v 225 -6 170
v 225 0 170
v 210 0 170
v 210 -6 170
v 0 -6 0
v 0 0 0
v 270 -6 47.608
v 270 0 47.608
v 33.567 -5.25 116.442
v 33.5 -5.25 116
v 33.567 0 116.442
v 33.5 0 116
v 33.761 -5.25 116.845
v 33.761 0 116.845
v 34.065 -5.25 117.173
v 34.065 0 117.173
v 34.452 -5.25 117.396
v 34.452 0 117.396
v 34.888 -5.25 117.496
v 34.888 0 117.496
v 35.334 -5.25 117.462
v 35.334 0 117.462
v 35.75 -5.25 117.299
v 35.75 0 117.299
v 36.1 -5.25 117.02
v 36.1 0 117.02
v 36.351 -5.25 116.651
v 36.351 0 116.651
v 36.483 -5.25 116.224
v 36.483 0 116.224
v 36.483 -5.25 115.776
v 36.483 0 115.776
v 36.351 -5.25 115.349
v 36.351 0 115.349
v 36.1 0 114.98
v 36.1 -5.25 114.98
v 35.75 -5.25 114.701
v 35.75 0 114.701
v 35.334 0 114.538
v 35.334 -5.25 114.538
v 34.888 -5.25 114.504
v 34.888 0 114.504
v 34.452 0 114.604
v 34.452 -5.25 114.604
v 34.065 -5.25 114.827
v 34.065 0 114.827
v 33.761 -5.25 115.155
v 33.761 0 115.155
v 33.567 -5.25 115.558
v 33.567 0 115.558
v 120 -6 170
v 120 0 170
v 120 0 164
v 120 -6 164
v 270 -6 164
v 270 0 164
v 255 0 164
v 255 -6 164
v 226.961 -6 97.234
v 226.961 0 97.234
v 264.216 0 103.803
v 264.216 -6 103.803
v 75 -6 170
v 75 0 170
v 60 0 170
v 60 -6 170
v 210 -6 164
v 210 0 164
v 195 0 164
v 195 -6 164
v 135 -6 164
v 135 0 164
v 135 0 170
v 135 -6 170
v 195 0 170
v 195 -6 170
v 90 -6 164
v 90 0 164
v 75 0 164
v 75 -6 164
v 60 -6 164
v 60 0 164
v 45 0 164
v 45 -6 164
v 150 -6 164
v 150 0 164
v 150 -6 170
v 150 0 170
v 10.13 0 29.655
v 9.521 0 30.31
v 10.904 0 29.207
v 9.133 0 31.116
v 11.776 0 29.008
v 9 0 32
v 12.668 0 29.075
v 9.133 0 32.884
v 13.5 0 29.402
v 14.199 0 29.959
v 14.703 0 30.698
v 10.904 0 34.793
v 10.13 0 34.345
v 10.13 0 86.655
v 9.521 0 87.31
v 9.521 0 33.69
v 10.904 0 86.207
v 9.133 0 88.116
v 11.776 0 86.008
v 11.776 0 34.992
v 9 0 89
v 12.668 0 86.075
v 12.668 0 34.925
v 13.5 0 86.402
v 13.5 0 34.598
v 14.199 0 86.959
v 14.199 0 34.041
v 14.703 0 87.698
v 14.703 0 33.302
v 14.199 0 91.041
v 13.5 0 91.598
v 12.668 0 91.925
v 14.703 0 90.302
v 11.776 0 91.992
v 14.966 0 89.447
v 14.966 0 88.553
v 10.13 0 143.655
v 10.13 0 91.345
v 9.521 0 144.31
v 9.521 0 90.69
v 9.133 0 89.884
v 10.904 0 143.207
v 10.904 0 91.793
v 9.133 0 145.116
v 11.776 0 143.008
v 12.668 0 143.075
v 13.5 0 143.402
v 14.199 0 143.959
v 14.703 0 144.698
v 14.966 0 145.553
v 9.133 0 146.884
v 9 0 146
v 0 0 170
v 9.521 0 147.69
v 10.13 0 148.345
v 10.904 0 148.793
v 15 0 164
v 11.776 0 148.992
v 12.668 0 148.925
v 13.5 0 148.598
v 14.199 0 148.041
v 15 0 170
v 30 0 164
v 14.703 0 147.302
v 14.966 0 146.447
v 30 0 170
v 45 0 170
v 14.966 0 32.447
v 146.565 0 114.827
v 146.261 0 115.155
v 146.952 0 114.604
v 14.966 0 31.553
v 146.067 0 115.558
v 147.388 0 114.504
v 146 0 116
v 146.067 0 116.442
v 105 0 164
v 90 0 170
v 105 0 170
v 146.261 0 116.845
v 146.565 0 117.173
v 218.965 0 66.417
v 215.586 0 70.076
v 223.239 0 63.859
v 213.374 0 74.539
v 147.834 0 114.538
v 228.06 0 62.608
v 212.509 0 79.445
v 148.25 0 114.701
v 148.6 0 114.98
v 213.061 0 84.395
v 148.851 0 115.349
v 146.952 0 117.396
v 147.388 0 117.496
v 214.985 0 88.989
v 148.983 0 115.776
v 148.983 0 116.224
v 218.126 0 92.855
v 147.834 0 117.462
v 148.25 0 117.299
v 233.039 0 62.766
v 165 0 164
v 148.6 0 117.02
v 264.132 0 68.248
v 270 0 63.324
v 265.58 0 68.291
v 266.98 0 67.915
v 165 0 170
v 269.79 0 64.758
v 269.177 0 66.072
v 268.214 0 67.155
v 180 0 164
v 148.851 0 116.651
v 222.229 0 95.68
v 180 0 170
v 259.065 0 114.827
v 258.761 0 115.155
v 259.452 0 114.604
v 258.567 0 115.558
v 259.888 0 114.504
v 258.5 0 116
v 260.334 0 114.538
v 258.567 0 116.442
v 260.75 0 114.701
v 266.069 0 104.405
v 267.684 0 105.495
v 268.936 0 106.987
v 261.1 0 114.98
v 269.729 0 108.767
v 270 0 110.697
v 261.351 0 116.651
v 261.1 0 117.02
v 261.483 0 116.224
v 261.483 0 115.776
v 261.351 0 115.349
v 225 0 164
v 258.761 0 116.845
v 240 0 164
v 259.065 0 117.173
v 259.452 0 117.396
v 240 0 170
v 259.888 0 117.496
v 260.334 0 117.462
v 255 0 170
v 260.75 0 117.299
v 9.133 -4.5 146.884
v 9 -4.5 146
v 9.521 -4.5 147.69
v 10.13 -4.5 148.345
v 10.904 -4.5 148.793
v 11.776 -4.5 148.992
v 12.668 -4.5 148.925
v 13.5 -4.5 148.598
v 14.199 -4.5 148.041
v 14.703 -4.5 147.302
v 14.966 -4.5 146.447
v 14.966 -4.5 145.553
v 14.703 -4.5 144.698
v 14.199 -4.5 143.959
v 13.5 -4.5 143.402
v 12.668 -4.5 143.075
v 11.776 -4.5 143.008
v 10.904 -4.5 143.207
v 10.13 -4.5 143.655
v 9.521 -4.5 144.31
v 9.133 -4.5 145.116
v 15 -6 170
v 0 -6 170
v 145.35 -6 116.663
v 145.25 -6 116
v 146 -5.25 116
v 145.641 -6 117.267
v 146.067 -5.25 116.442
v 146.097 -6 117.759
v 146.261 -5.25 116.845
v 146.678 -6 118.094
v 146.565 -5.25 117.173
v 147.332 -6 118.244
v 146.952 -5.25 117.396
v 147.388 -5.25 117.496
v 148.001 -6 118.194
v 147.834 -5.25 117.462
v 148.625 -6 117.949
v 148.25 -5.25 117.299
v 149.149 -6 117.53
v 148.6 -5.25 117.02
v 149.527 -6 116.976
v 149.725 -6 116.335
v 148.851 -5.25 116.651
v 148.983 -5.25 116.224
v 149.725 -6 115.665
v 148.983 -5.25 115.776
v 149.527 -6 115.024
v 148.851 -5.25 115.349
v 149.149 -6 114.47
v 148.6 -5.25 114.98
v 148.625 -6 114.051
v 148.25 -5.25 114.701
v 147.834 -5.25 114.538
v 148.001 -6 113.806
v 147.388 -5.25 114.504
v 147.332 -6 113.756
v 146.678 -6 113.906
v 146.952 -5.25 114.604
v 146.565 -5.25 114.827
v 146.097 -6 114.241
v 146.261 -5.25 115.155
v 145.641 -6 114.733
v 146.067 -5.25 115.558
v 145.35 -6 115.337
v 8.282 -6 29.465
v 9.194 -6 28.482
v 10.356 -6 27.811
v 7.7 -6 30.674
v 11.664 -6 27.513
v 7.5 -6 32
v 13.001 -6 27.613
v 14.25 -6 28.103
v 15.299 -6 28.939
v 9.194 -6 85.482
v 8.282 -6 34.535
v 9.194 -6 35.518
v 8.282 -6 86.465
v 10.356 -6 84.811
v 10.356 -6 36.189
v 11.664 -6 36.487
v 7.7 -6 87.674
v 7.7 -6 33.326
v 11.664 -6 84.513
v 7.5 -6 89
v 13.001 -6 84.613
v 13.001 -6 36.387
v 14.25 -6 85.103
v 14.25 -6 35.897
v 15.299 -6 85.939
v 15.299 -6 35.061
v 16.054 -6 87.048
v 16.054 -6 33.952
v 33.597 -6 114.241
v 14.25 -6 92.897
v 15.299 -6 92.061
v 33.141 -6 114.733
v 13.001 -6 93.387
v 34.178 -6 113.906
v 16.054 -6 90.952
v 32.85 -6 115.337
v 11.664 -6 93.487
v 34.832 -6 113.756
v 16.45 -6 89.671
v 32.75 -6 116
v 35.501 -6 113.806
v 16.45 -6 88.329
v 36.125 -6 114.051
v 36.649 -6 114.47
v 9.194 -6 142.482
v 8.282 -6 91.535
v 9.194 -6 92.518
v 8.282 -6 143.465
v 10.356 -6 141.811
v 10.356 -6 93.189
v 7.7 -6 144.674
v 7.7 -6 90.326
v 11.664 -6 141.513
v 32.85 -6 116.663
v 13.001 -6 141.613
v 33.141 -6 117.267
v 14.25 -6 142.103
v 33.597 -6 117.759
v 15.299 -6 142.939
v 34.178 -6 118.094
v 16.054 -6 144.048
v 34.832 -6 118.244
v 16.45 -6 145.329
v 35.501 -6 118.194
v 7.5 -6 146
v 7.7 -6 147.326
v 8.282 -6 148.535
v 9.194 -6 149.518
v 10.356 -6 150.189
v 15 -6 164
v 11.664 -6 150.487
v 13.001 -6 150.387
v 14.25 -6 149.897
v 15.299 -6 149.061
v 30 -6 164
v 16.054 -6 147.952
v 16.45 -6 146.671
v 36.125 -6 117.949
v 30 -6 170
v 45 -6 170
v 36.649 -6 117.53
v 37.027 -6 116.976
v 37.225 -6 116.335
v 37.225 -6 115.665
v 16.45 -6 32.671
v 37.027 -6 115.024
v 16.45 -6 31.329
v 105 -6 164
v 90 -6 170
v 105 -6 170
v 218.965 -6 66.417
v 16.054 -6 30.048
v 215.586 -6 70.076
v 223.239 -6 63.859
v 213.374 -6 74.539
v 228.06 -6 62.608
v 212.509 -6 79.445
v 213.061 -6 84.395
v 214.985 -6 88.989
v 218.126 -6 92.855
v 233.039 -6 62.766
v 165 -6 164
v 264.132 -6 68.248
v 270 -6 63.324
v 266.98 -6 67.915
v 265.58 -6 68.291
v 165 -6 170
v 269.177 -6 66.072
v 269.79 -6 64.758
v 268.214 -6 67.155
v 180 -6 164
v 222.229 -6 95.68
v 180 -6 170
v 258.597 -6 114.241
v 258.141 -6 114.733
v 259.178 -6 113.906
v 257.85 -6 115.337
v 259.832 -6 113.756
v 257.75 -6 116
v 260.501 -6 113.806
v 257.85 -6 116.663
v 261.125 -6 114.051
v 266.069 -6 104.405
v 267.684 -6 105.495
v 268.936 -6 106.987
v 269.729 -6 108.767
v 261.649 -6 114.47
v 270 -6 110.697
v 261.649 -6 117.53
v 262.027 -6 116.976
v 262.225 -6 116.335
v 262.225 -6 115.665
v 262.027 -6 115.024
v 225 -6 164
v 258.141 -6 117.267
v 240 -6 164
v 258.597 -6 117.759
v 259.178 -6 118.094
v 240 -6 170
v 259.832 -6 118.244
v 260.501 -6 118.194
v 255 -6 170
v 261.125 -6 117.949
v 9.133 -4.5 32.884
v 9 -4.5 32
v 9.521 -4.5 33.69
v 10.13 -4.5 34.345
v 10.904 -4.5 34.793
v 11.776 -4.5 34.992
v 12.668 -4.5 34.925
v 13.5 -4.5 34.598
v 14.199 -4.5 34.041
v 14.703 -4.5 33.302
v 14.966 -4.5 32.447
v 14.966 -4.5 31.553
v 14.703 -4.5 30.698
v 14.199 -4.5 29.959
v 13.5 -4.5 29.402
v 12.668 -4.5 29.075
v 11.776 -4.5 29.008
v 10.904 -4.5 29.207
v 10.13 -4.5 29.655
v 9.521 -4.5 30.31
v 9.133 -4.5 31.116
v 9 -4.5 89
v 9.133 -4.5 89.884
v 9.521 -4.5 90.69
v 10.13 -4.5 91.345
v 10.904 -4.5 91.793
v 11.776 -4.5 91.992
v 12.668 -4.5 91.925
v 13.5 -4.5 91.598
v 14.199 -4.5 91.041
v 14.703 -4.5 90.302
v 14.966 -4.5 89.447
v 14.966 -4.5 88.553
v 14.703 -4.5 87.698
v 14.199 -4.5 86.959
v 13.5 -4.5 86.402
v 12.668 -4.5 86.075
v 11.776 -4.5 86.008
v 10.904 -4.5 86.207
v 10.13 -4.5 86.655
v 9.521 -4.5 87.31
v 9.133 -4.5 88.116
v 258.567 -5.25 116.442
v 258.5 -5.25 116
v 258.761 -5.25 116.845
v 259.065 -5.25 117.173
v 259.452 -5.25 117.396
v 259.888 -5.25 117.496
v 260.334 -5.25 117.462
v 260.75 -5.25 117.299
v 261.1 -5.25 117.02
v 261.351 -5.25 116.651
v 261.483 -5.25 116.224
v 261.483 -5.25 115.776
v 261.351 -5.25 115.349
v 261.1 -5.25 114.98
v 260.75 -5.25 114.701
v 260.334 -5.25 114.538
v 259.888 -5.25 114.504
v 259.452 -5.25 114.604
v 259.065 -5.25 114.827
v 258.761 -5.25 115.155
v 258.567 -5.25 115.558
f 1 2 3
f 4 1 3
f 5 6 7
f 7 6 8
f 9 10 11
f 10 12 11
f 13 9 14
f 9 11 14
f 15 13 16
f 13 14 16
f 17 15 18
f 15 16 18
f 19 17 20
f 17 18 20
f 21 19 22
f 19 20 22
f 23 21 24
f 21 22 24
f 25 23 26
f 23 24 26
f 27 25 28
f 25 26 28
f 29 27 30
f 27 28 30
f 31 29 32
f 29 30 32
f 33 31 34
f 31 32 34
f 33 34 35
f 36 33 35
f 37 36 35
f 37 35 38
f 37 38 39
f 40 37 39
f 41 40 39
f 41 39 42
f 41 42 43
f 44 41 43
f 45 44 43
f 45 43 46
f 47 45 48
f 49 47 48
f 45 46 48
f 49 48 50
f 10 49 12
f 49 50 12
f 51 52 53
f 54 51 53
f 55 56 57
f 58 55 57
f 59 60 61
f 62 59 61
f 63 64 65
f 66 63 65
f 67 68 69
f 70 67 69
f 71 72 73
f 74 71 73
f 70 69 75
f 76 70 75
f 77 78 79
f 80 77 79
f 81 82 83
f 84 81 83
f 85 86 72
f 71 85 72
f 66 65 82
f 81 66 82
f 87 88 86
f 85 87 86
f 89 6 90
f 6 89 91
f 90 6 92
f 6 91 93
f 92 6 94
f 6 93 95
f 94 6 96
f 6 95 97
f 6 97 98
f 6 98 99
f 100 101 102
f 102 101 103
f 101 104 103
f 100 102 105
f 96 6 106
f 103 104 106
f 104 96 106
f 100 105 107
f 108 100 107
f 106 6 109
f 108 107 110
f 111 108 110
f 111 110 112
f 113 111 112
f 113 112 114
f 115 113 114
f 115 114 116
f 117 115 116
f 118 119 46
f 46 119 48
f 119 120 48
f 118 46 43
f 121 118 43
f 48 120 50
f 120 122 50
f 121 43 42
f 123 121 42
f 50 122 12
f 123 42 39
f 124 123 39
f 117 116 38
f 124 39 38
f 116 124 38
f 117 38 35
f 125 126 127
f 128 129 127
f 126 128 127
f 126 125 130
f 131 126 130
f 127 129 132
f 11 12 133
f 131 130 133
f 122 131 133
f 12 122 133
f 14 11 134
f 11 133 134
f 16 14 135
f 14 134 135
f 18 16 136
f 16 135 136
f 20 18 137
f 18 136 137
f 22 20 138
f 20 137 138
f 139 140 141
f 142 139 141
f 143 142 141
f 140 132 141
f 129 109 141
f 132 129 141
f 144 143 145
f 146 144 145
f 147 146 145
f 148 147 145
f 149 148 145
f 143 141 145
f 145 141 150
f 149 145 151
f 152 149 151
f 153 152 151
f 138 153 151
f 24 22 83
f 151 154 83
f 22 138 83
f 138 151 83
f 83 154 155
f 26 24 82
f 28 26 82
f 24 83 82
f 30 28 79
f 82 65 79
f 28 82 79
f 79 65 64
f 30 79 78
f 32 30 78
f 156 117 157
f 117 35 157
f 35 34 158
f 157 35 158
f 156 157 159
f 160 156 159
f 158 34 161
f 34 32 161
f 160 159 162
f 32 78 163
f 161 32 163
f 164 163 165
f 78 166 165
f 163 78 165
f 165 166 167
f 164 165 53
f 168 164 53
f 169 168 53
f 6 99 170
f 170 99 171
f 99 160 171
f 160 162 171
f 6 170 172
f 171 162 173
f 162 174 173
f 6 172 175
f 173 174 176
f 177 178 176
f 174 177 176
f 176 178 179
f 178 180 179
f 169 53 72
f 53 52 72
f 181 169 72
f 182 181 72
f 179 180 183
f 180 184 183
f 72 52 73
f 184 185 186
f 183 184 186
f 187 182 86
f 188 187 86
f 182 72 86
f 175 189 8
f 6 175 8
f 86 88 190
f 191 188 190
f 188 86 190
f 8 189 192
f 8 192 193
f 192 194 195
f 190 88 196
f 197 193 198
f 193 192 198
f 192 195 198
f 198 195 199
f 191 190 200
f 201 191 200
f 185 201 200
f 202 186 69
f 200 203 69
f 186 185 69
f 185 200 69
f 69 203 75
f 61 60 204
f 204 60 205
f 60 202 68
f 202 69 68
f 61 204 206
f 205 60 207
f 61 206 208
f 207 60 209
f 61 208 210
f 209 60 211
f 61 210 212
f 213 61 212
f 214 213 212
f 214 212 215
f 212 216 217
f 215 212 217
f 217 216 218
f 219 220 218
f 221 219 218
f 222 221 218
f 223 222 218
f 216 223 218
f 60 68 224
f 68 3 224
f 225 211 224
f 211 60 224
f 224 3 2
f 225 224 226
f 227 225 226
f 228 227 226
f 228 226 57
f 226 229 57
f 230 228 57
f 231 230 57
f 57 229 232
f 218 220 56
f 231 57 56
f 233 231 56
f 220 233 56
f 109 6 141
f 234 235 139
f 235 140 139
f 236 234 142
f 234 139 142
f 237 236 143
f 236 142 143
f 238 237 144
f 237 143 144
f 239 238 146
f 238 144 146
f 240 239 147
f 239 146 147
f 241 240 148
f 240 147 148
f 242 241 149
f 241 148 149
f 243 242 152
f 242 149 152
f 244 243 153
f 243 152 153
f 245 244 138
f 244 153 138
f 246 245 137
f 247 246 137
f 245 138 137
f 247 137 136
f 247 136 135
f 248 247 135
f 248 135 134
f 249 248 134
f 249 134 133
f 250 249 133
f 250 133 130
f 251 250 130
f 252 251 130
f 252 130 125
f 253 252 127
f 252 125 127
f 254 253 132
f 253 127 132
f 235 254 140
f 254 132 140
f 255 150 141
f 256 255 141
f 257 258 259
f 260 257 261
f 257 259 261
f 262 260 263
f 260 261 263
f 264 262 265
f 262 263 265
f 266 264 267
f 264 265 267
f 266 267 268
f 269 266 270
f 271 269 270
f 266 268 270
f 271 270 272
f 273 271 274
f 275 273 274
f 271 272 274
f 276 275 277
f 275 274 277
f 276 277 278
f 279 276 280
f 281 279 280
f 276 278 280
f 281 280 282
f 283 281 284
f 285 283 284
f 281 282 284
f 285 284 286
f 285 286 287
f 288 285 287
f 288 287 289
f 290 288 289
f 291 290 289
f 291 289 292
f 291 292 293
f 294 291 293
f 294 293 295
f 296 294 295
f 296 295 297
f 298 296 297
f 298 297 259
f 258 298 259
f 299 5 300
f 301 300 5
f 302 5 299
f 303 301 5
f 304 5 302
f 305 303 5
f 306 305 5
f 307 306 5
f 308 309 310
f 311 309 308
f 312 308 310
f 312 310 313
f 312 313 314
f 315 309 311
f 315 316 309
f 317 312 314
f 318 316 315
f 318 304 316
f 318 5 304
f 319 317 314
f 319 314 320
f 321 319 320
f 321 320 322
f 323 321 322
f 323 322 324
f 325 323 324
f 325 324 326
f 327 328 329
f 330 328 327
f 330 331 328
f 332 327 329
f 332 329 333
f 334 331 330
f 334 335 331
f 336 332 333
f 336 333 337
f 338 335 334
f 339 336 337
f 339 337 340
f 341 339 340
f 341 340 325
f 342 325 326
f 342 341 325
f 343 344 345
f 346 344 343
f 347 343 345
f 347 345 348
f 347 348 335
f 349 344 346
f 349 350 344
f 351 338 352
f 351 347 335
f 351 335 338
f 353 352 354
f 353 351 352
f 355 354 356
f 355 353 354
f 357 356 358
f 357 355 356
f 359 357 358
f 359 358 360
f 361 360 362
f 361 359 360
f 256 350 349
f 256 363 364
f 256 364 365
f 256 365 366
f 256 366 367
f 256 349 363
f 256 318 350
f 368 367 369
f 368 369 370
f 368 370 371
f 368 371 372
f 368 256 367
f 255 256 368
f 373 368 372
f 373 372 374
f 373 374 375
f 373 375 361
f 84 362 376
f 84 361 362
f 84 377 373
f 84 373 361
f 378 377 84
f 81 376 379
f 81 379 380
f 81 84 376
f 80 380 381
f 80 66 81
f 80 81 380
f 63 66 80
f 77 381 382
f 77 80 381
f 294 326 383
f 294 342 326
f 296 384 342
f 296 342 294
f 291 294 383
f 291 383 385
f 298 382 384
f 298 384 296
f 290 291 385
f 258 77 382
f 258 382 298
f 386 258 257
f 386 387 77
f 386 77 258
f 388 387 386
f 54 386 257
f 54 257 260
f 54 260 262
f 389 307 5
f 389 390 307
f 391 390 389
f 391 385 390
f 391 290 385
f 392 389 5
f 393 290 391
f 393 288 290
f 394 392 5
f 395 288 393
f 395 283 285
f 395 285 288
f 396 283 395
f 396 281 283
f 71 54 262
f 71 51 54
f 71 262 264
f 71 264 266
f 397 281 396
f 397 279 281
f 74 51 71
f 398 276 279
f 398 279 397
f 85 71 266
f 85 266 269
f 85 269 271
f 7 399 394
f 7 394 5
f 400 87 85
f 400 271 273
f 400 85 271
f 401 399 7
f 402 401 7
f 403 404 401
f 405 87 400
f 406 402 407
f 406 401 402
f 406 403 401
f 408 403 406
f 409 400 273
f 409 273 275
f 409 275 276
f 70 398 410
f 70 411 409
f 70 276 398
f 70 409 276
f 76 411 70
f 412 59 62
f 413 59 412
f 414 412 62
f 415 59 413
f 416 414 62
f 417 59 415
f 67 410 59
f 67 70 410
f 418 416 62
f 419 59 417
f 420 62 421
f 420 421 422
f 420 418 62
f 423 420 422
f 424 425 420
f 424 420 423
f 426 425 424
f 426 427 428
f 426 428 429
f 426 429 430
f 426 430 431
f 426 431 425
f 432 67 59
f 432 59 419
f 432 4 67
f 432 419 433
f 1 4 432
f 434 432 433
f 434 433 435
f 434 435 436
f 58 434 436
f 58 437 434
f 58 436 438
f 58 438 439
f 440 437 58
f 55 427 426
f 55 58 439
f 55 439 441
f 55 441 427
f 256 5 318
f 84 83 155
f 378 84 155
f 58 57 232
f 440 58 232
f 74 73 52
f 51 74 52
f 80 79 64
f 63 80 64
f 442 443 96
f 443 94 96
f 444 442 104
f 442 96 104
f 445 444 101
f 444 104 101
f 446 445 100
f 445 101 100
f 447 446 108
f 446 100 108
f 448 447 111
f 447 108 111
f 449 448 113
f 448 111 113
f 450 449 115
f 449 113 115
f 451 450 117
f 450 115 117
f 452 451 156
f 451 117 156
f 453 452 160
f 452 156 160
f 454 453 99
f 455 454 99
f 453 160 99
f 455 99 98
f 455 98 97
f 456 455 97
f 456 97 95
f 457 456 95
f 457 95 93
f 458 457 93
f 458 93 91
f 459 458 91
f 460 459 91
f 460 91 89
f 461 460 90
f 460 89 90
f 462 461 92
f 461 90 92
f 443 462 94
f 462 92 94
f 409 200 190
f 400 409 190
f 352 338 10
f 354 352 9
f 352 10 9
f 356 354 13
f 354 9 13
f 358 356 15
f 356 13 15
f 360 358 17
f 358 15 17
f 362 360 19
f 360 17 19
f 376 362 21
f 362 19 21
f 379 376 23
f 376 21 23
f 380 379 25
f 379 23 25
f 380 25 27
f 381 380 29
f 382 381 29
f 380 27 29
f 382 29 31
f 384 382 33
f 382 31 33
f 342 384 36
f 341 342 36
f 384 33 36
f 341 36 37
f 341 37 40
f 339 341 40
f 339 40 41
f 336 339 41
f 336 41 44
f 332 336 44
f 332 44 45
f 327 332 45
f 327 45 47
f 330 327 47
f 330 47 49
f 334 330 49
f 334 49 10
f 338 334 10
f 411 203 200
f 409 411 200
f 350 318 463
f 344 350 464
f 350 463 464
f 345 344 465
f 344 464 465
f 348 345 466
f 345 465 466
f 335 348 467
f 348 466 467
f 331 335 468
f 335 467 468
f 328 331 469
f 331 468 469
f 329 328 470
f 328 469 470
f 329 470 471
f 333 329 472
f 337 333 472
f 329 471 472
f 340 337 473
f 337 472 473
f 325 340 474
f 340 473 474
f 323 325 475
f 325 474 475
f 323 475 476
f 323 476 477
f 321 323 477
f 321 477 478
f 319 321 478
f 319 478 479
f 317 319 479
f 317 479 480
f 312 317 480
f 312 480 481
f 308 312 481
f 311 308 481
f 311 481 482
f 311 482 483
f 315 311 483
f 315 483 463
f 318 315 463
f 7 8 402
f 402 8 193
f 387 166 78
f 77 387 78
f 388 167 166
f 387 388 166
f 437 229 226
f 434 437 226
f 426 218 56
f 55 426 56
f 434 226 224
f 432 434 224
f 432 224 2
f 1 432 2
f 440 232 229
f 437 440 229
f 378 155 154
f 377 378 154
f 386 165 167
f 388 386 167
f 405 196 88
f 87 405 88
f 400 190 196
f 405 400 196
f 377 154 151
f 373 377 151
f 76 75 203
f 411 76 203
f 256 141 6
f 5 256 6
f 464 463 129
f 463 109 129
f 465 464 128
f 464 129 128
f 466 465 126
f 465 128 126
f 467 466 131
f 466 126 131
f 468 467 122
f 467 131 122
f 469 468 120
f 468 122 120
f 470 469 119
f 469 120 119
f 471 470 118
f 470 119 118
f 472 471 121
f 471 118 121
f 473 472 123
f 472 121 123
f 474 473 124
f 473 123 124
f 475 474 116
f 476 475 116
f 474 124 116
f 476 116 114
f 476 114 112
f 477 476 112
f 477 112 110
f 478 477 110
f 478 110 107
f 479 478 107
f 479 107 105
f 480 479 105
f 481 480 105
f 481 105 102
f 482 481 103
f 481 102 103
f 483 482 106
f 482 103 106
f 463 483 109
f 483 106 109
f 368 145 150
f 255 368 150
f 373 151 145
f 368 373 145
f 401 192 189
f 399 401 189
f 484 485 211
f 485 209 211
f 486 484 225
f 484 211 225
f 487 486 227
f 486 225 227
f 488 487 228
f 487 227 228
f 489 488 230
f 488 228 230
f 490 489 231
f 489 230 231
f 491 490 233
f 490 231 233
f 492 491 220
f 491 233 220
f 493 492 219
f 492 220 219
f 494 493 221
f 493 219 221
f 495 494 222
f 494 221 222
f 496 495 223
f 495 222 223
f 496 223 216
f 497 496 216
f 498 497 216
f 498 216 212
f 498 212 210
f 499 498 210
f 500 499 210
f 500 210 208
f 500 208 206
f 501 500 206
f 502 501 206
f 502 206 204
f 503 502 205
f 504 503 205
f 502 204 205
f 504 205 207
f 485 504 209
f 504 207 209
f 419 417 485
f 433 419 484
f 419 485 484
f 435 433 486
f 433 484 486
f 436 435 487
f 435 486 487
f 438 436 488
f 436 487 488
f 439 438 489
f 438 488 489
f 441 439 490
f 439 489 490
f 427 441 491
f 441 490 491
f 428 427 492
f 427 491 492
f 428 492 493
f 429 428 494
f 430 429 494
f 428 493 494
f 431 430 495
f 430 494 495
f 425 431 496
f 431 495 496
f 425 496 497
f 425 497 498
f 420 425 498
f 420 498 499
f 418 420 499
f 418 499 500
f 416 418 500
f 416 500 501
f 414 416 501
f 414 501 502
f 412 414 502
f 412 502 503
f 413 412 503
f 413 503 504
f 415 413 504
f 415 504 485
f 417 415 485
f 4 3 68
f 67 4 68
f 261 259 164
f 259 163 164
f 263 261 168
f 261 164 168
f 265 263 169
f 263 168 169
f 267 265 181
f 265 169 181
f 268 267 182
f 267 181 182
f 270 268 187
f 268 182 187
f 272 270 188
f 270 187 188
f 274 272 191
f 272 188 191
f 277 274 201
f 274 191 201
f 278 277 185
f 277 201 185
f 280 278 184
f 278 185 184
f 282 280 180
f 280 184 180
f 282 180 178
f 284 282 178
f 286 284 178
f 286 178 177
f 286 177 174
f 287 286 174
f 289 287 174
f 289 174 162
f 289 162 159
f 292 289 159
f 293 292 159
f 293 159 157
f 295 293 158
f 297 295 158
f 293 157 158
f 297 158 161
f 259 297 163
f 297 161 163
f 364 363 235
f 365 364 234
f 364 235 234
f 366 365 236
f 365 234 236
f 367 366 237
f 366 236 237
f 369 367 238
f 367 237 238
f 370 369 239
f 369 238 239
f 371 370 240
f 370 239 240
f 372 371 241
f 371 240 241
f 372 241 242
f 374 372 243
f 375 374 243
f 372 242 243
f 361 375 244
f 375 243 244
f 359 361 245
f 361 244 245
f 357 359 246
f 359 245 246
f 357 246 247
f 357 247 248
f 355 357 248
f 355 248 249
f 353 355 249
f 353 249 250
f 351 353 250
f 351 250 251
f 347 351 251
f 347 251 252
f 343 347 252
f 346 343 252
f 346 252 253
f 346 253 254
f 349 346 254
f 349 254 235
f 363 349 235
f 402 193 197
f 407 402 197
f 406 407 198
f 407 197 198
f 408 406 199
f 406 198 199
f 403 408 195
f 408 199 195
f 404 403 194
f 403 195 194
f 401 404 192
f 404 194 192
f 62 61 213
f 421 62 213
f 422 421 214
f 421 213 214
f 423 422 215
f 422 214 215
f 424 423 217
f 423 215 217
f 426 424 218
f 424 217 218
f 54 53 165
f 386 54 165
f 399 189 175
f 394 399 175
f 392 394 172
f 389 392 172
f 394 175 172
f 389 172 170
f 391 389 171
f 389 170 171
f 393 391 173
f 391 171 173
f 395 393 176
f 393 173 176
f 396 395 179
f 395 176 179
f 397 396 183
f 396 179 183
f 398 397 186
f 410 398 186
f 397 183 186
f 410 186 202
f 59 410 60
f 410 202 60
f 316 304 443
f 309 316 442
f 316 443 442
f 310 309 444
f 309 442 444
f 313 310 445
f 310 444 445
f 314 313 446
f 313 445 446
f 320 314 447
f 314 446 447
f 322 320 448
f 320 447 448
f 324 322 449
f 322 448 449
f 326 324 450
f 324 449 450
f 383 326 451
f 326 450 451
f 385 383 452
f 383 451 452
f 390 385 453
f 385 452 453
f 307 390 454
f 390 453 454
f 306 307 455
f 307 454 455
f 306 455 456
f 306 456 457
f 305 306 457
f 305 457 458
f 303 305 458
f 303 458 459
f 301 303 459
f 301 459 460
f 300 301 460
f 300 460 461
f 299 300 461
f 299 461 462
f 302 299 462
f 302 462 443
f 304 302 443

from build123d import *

# Parameters (mm, degrees)
F1_DEPTH       = 6
F3_D           = 6
F3_CSINK_D     = 9
F3_CSINK_ANGLE = 90
F5_D           = 3
F5_CSINK_D     = 4.5
F5_CSINK_ANGLE = 90


with BuildPart() as f1:
    # F0 (on Front) → F1 (new body)
    with BuildSketch(Plane.XZ):
        with BuildLine():
            Line((0, 170), (0, 0))
            Line((0, 0), (270, 47.6082847913))
            Line((270, 47.6082847913), (270, 63.3243455574))
            ThreePointArc((270, 63.3243455574), (268.2139380484, 67.154567773), (264.1317591117, 68.2483843224))
            Line((264.1317591117, 68.2483843224), (233.0388431092, 62.7658643223))
            ThreePointArc((233.0388431092, 62.7658643223), (212.7658643223, 76.9611568908), (226.9611568908, 97.2341356777))
            Line((226.9611568908, 97.2341356777), (264.2155372437, 103.8030880835))
            ThreePointArc((264.2155372437, 103.8030880835), (268.3623111018, 106.1972290868), (270, 110.6967423546))
            Line((270, 110.6967423546), (270, 164))
            Line((270, 164), (255, 164))
            Line((255, 164), (255, 170))
            Line((255, 170), (240, 170))
            Line((240, 170), (240, 164))
            Line((240, 164), (225, 164))
            Line((225, 164), (225, 170))
            Line((225, 170), (210, 170))
            Line((210, 170), (210, 164))
            Line((210, 164), (195, 164))
            Line((195, 164), (195, 170))
            Line((195, 170), (180, 170))
            Line((180, 170), (180, 164))
            Line((180, 164), (165, 164))
            Line((165, 164), (165, 170))
            Line((165, 170), (150, 170))
            Line((150, 170), (150, 164))
            Line((150, 164), (135, 164))
            Line((135, 164), (135, 170))
            Line((135, 170), (120, 170))
            Line((120, 170), (120, 164))
            Line((120, 164), (105, 164))
            Line((105, 164), (105, 170))
            Line((105, 170), (90, 170))
            Line((90, 170), (90, 164))
            Line((90, 164), (75, 164))
            Line((75, 164), (75, 170))
            Line((75, 170), (60, 170))
            Line((60, 170), (60, 164))
            Line((60, 164), (45, 164))
            Line((45, 164), (45, 170))
            Line((45, 170), (30, 170))
            Line((30, 170), (30, 164))
            Line((30, 164), (15, 164))
            Line((15, 164), (15, 170))
            Line((15, 170), (0, 170))
        make_face()
    extrude(amount=F1_DEPTH)

    # F3 (through all)
    with Locations(Plane.XZ.offset(6)):
        with Locations((12, 146), (12, 89), (12, 32)):
            CounterSinkHole(F3_D / 2, F3_CSINK_D / 2, counter_sink_angle=F3_CSINK_ANGLE)

    # F5 (through all)
    with Locations(Plane.XZ.offset(6)):
        with Locations((35, 116), (147.5, 116), (260, 116)):
            CounterSinkHole(F5_D / 2, F5_CSINK_D / 2, counter_sink_angle=F5_CSINK_ANGLE)


solid = f1.part
